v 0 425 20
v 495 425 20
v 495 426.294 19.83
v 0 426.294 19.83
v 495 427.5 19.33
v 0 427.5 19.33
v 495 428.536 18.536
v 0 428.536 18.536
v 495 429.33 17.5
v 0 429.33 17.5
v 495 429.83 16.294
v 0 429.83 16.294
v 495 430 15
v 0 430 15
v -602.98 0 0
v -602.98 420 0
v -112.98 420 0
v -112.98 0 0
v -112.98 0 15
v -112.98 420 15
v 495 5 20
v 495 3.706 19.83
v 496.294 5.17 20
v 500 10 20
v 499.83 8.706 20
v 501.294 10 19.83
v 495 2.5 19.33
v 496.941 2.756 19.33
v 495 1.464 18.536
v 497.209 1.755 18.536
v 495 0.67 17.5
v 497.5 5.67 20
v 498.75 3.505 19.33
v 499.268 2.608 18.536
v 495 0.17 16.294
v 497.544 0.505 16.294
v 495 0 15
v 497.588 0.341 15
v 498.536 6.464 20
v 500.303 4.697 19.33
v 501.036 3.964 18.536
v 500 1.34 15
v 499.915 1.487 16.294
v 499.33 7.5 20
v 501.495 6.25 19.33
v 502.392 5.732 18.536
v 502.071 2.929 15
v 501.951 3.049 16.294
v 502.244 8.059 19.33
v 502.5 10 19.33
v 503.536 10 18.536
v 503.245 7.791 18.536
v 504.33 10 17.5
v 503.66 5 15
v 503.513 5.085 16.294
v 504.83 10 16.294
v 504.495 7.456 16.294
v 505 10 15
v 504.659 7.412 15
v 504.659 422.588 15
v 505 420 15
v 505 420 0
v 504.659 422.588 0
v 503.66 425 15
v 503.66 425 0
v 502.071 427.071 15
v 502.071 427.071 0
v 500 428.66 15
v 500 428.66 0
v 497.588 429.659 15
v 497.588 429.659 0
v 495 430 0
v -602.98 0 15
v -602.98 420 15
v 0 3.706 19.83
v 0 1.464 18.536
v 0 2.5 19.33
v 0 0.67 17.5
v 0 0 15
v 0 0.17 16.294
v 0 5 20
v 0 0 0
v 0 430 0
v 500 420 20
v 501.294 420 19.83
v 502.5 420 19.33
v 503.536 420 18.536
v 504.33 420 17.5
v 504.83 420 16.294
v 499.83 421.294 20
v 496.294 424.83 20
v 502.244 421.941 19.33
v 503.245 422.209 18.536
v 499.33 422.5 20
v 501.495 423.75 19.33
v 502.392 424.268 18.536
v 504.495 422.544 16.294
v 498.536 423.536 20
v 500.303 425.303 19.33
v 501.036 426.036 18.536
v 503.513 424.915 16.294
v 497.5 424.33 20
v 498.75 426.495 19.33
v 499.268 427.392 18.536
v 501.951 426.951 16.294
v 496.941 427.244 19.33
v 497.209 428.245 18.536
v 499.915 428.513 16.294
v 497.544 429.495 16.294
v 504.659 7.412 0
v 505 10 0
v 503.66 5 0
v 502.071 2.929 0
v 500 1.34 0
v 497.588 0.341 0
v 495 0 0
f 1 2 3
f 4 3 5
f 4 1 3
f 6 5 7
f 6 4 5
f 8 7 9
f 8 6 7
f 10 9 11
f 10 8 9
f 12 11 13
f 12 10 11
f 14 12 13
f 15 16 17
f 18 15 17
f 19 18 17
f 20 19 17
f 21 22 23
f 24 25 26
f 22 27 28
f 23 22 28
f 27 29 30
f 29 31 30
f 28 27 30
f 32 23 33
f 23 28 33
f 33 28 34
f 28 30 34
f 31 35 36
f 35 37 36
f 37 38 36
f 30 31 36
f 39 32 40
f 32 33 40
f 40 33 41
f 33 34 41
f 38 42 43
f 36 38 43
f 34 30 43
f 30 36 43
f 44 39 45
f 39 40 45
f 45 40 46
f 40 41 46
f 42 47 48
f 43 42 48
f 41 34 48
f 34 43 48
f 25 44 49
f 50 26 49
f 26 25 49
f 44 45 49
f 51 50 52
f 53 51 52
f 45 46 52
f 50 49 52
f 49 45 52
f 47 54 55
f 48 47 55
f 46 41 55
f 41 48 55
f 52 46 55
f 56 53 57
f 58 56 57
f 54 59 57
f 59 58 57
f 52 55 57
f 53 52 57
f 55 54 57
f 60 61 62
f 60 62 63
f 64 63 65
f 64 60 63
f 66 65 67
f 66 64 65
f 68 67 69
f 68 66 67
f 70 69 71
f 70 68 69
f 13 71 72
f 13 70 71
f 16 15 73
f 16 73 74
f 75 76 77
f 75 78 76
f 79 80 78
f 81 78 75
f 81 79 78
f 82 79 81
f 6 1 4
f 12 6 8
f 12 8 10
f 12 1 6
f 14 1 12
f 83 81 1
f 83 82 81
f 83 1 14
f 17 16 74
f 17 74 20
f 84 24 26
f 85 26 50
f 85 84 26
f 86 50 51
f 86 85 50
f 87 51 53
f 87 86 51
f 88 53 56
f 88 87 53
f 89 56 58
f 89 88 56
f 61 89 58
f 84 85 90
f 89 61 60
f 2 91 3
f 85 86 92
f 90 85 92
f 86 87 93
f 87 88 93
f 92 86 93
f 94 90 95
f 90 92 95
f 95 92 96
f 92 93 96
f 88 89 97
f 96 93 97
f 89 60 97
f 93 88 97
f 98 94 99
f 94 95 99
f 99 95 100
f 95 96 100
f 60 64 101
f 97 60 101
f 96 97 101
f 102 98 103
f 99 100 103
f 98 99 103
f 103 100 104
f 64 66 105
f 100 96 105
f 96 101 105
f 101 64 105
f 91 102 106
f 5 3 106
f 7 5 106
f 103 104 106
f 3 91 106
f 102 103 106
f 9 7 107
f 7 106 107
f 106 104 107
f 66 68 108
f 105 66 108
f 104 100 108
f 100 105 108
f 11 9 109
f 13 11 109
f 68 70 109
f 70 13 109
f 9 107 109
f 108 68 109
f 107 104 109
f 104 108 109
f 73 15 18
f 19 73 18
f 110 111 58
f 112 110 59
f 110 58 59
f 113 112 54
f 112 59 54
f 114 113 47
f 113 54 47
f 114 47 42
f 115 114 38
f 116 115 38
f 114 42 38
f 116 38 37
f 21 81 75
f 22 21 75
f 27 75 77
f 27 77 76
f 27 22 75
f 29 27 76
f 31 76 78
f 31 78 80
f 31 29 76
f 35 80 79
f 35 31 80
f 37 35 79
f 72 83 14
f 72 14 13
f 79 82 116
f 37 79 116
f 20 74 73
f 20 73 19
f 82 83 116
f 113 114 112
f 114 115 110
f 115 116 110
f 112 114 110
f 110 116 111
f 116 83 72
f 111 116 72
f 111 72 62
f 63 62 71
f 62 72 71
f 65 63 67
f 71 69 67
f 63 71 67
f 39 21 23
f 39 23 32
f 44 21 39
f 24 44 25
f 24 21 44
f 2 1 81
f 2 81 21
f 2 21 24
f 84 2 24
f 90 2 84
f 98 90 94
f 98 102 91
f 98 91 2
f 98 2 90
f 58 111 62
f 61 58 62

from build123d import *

# Parameters (mm, degrees)
F0_W     = 505
F0_H     = 430
F1_DEPTH = 20
F2_W     = 490
F2_H     = 420
F3_DEPTH = 15
F4_R     = 10
F5_R     = 10
F6_R     = 5


with BuildPart() as f1:
    # F0 (on Top) → F1 (new body)
    with BuildSketch(Plane.XY):
        with Locations((252.5, 215)):
            Rectangle(F0_W, F0_H)
    extrude(amount=F1_DEPTH)

    # F4
    f4_edges = [f1.edges().sort_by_distance(p)[0] for p in [
        (505, 430, 10),
    ]]
    fillet(f4_edges, radius=F4_R)

    # F5
    f5_edges = [f1.edges().sort_by_distance(p)[0] for p in [
        (505, 0, 10),
    ]]
    fillet(f5_edges, radius=F5_R)

    # F6
    f6_edges = [f1.edges().sort_by_distance(p)[0] for p in [
        (247.5, 0, 20),
    ]]
    fillet(f6_edges, radius=F6_R)


with BuildPart() as f3:
    # F2 (on Top) → F3 (new body)
    with BuildSketch(Plane.XY):
        with Locations((-357.980487, 210)):
            Rectangle(F2_W, F2_H)
    extrude(amount=F3_DEPTH)


solid = Compound([f1.part, f3.part])
